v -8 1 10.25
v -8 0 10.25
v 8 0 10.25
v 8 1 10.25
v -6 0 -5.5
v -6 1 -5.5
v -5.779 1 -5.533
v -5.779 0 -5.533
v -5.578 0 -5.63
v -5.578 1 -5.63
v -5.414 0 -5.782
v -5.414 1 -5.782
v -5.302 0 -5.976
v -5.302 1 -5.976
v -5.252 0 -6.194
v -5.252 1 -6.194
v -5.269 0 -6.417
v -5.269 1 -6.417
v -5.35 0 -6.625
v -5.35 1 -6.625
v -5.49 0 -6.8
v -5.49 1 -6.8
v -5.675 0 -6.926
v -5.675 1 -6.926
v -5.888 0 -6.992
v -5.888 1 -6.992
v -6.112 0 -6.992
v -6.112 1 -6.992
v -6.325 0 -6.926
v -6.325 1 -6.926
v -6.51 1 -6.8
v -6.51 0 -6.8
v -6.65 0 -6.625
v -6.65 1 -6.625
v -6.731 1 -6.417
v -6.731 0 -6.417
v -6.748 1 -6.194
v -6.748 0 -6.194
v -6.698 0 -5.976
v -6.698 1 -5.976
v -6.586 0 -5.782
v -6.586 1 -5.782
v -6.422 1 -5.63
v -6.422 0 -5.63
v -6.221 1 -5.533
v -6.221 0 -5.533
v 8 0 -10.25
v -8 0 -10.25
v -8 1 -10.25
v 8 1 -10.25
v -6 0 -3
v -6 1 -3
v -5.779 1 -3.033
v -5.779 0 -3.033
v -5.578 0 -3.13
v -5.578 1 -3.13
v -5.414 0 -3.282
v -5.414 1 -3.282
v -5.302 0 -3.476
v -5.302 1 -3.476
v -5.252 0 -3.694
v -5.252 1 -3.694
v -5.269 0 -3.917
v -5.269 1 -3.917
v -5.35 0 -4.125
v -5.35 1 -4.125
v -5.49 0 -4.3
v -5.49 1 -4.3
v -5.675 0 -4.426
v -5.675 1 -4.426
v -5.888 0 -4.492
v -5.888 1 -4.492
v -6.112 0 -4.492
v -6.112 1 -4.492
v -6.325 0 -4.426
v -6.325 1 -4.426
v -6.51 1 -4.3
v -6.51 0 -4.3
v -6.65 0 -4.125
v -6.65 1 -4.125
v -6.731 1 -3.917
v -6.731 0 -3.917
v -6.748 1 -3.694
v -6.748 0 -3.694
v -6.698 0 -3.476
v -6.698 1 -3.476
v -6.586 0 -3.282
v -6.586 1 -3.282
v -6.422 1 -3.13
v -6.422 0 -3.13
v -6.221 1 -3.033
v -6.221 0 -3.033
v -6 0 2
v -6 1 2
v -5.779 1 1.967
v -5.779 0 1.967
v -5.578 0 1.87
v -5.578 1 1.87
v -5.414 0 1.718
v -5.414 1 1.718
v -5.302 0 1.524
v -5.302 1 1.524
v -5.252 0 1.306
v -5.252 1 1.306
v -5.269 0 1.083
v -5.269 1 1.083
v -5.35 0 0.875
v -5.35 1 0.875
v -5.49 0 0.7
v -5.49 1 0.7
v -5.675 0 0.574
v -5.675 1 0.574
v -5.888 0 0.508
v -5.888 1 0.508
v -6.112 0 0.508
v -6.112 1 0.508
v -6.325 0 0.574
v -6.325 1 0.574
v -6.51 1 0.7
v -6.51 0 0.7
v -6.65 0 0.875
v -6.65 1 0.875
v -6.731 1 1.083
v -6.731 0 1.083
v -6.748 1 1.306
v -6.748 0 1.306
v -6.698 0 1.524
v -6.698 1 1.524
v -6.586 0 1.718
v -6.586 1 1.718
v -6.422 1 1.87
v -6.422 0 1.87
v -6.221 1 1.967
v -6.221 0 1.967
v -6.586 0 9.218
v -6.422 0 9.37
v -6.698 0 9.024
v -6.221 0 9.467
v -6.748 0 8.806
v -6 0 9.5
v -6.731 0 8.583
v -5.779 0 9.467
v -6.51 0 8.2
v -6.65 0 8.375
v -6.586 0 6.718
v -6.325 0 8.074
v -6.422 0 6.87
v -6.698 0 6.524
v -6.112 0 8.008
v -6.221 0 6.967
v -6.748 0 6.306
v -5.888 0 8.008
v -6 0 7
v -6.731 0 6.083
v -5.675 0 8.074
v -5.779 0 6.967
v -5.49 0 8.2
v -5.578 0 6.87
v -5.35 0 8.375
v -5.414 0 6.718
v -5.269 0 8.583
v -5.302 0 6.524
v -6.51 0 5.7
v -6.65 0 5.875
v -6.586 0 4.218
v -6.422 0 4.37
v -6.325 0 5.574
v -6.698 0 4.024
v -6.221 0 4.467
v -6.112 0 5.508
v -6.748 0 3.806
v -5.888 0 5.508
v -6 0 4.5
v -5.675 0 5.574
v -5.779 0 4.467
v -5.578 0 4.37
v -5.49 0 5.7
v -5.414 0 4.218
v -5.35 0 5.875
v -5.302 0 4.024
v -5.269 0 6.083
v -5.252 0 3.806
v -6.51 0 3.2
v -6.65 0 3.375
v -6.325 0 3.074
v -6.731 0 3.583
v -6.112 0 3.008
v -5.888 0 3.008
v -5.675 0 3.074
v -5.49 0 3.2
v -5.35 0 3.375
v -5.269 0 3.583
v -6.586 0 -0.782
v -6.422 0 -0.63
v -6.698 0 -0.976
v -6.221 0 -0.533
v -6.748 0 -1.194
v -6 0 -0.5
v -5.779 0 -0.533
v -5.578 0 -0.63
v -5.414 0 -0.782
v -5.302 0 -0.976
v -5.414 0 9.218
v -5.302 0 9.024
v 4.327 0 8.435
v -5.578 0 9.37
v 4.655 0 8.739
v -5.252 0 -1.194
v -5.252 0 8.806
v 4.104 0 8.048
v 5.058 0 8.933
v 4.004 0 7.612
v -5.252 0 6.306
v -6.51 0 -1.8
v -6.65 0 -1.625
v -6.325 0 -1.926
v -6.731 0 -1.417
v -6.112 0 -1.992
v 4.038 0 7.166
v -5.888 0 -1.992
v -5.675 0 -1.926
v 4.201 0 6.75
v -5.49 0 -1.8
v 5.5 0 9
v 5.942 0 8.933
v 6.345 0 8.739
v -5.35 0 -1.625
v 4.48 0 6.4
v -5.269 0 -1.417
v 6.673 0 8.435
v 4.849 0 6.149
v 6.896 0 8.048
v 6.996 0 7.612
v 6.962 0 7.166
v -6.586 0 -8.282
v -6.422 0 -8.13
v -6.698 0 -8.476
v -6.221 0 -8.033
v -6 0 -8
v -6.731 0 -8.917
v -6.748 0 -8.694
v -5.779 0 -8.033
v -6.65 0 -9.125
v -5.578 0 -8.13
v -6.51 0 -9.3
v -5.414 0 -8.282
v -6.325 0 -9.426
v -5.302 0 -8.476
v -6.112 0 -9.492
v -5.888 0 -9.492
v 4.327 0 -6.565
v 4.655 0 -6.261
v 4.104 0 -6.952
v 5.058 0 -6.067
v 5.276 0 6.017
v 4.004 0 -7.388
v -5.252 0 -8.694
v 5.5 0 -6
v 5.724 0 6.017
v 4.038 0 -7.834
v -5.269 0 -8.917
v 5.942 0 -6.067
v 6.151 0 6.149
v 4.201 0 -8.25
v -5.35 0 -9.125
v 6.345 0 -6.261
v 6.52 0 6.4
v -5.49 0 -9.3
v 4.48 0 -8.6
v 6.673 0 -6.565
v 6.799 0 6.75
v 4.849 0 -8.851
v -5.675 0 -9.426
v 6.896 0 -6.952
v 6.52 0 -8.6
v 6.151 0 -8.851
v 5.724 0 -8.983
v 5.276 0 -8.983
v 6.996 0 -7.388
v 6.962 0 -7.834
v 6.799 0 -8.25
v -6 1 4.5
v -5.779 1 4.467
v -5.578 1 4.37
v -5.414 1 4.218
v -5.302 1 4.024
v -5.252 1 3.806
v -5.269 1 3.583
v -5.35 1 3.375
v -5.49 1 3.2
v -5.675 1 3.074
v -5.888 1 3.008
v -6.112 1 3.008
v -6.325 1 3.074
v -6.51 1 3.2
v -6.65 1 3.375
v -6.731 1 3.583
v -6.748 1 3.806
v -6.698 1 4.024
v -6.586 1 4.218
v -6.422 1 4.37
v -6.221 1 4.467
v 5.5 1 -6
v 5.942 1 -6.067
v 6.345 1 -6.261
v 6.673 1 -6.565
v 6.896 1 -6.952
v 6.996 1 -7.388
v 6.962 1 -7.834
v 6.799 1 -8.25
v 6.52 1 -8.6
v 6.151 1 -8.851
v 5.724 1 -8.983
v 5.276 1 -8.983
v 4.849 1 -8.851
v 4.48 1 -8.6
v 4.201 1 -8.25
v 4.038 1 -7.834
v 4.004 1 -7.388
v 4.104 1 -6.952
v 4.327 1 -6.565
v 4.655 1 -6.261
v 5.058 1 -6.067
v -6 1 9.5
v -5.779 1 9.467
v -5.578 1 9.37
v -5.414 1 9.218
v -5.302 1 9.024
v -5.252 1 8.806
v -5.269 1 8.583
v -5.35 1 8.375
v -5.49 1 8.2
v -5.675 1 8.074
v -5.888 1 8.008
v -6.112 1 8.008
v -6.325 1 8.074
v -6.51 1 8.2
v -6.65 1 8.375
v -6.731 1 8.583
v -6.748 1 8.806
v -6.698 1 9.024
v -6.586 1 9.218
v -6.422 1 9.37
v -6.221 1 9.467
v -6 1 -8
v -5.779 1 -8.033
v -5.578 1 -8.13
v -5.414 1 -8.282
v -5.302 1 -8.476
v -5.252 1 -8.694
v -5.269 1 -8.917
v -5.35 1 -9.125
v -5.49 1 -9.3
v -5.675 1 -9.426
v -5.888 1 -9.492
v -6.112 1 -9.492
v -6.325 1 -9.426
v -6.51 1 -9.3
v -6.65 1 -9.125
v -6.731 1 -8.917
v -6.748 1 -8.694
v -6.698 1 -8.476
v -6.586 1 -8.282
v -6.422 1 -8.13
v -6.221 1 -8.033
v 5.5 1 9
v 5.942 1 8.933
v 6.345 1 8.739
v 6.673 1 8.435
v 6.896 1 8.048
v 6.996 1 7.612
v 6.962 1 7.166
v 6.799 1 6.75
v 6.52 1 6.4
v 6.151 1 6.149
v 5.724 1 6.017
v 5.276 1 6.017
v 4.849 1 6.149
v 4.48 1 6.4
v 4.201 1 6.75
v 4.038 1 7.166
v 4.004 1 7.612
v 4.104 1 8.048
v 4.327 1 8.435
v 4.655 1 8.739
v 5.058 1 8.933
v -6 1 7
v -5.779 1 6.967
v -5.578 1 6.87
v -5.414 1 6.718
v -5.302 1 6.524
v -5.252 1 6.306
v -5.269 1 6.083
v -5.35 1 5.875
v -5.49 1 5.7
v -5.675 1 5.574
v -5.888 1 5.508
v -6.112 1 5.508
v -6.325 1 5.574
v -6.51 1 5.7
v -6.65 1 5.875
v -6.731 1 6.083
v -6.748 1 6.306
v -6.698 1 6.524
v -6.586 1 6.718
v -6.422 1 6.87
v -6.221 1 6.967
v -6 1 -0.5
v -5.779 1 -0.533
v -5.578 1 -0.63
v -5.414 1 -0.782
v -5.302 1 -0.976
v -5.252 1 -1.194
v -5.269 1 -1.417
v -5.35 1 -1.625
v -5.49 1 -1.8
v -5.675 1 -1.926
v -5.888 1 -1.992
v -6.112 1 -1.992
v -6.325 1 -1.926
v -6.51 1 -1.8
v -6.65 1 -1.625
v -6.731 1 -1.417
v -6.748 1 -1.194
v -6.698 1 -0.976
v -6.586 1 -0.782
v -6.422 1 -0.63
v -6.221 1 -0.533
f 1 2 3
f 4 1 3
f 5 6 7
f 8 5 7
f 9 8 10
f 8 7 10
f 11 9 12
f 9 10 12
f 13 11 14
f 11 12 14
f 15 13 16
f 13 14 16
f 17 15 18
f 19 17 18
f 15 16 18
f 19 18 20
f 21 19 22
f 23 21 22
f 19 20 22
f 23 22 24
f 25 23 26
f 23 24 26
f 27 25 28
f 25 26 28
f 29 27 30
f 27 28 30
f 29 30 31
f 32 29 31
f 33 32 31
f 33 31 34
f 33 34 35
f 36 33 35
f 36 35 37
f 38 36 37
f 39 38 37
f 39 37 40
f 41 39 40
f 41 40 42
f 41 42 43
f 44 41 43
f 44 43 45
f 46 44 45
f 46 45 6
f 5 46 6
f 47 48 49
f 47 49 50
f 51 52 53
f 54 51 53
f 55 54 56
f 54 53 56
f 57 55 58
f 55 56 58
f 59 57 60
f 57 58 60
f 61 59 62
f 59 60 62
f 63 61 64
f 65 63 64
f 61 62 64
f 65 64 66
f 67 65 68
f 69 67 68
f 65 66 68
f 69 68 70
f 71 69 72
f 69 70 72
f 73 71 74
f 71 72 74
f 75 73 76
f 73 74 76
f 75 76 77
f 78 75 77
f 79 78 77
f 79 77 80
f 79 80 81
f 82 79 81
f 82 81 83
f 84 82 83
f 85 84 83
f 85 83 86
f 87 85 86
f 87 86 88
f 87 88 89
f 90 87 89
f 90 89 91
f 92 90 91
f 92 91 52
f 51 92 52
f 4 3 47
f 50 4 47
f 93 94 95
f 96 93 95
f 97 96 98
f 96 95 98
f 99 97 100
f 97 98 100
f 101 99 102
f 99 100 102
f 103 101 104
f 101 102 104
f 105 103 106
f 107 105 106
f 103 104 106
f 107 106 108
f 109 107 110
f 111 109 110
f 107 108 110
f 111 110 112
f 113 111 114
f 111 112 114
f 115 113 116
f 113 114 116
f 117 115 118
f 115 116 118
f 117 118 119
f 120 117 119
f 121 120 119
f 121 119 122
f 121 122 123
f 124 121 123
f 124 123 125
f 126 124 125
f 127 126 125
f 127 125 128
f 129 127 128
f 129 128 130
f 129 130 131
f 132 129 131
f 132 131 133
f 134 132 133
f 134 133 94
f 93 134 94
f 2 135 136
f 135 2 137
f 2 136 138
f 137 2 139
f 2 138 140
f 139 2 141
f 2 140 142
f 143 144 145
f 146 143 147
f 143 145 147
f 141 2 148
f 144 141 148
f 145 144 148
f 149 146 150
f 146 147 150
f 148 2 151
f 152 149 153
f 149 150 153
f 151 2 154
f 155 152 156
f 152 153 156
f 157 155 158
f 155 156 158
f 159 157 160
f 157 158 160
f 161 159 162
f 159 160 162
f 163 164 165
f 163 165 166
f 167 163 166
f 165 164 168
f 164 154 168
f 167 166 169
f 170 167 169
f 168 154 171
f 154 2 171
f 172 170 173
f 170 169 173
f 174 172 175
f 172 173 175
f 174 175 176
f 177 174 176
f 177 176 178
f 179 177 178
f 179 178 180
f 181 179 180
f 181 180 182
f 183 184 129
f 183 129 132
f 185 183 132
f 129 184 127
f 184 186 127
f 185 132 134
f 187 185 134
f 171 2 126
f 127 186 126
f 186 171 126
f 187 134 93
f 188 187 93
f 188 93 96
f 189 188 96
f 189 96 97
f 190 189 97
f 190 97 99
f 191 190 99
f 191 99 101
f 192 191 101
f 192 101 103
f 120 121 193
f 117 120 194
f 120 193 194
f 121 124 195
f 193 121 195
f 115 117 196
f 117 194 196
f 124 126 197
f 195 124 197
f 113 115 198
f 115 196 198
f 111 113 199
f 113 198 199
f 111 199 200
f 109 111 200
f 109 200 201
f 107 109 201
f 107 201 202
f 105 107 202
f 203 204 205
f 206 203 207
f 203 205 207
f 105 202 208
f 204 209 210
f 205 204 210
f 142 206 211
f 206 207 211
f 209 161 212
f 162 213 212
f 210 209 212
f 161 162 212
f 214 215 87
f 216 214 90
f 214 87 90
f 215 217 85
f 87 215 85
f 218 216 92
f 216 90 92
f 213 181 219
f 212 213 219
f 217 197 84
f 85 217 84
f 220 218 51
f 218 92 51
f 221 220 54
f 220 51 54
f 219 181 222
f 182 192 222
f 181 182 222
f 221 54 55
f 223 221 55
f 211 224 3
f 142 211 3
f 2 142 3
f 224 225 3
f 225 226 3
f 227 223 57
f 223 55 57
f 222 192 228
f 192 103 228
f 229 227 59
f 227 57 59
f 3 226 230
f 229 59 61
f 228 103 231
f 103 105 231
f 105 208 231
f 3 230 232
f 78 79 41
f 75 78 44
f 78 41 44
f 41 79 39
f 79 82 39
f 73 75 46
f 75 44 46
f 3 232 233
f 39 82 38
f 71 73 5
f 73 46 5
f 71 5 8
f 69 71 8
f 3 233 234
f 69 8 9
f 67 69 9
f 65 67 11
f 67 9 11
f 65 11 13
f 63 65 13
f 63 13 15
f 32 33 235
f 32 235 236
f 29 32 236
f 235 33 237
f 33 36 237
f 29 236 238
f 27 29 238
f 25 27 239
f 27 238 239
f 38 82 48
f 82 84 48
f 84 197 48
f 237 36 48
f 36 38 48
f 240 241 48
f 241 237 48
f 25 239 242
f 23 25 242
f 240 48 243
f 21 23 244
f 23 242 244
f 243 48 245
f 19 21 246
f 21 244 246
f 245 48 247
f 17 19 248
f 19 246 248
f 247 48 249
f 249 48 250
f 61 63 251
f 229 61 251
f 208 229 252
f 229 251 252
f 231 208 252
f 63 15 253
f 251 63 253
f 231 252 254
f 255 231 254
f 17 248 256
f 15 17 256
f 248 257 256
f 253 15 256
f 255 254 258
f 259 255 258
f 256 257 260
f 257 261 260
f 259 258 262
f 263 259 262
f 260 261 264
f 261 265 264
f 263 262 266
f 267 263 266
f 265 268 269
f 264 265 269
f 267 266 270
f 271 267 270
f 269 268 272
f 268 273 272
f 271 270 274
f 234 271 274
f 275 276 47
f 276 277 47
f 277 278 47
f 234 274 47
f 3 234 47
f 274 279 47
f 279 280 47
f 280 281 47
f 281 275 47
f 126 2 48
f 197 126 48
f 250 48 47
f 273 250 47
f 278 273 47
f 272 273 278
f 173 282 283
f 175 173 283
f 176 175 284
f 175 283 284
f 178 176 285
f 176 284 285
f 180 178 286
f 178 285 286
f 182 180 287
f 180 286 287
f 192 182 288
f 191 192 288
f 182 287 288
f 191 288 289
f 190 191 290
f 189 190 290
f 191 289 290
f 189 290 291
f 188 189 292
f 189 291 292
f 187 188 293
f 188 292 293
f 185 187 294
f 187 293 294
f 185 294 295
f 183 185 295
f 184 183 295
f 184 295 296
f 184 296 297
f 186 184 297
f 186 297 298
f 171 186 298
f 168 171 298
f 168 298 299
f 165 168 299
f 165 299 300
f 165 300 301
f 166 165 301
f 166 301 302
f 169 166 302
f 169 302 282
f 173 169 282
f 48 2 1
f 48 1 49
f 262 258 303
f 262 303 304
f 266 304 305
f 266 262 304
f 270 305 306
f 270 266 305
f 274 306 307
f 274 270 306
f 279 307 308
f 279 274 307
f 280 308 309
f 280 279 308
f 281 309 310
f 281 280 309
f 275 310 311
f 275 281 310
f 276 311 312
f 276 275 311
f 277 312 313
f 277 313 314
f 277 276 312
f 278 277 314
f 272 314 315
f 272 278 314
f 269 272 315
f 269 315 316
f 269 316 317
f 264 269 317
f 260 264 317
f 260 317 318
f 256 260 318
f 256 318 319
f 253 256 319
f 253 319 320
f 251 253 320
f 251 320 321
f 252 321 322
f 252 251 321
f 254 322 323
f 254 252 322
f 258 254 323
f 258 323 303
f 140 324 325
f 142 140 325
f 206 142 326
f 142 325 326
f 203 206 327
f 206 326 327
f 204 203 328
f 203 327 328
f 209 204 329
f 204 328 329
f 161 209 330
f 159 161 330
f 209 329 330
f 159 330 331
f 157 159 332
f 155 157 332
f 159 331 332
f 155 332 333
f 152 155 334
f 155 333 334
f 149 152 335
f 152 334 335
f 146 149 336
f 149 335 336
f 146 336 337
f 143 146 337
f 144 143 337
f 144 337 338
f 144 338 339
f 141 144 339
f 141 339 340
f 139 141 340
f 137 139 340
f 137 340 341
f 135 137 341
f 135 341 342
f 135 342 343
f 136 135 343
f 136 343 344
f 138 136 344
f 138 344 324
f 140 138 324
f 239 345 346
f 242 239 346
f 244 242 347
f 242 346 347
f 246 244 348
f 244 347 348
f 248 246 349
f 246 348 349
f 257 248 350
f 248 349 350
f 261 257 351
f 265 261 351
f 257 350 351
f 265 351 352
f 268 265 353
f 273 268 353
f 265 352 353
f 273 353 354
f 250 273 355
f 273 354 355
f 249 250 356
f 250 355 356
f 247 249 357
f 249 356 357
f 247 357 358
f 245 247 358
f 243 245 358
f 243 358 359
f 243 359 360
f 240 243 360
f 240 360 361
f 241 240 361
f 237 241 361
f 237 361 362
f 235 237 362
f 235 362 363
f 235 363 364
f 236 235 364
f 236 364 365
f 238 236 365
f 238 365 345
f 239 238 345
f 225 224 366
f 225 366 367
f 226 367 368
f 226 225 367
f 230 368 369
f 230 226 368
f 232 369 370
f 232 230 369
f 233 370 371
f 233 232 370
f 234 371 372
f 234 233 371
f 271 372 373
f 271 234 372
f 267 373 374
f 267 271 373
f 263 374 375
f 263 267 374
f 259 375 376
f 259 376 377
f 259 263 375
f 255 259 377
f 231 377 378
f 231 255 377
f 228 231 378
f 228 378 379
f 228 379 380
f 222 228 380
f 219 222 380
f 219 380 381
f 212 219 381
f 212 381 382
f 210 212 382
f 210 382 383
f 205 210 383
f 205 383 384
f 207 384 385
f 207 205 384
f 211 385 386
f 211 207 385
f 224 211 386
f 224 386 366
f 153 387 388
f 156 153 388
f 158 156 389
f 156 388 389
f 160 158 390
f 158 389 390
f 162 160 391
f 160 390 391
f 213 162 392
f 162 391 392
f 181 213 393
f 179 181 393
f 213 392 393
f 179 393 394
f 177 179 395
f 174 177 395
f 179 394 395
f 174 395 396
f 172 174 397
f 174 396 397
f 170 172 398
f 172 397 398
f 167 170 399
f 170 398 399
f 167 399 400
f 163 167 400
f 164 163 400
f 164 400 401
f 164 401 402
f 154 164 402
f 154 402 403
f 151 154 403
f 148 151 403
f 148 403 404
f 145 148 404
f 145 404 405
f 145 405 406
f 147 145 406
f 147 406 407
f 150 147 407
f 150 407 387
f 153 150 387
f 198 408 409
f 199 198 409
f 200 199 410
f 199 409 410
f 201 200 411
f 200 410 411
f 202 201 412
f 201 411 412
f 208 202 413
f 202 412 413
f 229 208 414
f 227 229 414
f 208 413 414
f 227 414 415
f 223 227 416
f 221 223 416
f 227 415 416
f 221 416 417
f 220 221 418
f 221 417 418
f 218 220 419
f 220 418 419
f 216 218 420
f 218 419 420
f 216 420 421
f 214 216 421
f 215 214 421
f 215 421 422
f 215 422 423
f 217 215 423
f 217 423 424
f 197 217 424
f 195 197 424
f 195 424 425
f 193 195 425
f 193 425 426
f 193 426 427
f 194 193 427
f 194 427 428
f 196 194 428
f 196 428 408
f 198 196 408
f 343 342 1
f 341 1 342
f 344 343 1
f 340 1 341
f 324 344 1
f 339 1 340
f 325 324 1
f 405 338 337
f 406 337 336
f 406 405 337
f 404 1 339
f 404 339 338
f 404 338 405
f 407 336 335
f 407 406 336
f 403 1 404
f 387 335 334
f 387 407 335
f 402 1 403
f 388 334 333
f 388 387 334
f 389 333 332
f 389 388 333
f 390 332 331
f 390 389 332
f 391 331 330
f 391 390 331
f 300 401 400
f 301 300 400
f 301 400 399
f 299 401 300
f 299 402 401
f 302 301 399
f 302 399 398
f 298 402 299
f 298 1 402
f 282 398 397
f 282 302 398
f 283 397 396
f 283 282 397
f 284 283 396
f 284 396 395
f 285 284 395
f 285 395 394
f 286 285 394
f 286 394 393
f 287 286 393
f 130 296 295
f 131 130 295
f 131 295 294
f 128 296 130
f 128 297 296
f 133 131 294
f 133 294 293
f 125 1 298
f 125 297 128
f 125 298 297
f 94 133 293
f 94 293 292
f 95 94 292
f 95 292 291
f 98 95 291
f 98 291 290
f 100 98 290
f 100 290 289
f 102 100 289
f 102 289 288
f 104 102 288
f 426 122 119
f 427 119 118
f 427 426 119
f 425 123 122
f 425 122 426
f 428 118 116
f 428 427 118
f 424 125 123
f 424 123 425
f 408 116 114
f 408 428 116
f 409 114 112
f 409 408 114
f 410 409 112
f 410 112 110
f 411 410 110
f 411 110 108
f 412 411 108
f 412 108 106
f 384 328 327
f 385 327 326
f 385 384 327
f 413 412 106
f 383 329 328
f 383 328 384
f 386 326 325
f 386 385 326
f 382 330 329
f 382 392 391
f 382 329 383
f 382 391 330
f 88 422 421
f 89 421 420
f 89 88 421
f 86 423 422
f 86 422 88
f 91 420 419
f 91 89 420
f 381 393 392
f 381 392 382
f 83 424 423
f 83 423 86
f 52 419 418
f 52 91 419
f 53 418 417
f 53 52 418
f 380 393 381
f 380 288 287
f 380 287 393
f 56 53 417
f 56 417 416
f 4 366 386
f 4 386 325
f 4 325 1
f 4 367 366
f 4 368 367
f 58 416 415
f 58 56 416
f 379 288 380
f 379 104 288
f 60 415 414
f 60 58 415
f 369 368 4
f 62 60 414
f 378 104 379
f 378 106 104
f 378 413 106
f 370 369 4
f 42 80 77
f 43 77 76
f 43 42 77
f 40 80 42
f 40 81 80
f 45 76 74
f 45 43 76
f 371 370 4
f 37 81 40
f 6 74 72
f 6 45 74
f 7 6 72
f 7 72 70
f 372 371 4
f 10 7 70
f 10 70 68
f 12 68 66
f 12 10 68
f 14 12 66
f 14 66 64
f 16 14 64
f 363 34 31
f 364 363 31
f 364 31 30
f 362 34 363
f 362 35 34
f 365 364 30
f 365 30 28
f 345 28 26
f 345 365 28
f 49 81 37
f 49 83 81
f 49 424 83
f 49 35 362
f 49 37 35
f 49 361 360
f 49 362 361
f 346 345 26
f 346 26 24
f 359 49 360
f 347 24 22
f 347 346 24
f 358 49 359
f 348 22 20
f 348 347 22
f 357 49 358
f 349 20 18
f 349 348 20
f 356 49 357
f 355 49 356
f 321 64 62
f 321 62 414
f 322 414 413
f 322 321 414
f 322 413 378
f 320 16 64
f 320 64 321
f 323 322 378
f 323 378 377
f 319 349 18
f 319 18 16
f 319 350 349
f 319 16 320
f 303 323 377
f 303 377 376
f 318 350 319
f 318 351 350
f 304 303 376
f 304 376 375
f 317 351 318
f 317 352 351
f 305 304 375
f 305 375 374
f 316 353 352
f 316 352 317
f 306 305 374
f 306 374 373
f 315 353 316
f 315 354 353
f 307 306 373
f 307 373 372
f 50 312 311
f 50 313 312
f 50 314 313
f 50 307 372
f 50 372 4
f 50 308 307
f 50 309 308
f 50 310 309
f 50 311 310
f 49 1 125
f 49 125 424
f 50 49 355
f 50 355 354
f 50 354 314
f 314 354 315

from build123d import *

# Parameters (mm, degrees)
SKETCH1_W           = 16
SKETCH1_H           = 20.5
SKETCH1_R           = 1.5
BOSS_EXTRUDE1_DEPTH = 1
SKETCH2_R           = 0.75
CUT_EXTRUDE2_DEPTH  = 14.040801356


with BuildPart() as part:
    # Sketch1 → Boss-Extrude1 (new body)
    with BuildSketch(Plane(origin=(0, 0, 0), x_dir=(1, 0, 0), z_dir=(0, 1, 0))):
        Rectangle(SKETCH1_W, SKETCH1_H)
        with Locations(Location((5.5, 7.5, 0), (0, 0, 270))):
            Circle(SKETCH1_R, mode=Mode.SUBTRACT)
        with Locations(Location((5.5, -7.5, 0), (0, 0, 270))):
            Circle(SKETCH1_R, mode=Mode.SUBTRACT)
    extrude(amount=BOSS_EXTRUDE1_DEPTH)

    # Sketch2 → Cut-Extrude2 (cut, through all)
    with BuildSketch(Plane(origin=(0, 1, 0), x_dir=(1, 0, 0), z_dir=(0, 1, 0))):
        with Locations(Location((-6, 8.75, 0), (0, 0, 270))):
            Circle(SKETCH2_R)
        with Locations(Location((-6, 6.25, 0), (0, 0, 270))):
            Circle(SKETCH2_R)
        with Locations(Location((-6, 3.75, 0), (0, 0, 270))):
            Circle(SKETCH2_R)
        with Locations(Location((-6, 1.25, 0), (0, 0, 270))):
            Circle(SKETCH2_R)
        with Locations(Location((-6, -1.25, 0), (0, 0, 270))):
            Circle(SKETCH2_R)
        with Locations(Location((-6, -3.75, 0), (0, 0, 270))):
            Circle(SKETCH2_R)
        with Locations(Location((-6, -6.25, 0), (0, 0, 270))):
            Circle(SKETCH2_R)
        with Locations(Location((-6, -8.75, 0), (0, 0, 270))):
            Circle(SKETCH2_R)
    extrude(amount=-CUT_EXTRUDE2_DEPTH, mode=Mode.SUBTRACT)


solid = part.part
